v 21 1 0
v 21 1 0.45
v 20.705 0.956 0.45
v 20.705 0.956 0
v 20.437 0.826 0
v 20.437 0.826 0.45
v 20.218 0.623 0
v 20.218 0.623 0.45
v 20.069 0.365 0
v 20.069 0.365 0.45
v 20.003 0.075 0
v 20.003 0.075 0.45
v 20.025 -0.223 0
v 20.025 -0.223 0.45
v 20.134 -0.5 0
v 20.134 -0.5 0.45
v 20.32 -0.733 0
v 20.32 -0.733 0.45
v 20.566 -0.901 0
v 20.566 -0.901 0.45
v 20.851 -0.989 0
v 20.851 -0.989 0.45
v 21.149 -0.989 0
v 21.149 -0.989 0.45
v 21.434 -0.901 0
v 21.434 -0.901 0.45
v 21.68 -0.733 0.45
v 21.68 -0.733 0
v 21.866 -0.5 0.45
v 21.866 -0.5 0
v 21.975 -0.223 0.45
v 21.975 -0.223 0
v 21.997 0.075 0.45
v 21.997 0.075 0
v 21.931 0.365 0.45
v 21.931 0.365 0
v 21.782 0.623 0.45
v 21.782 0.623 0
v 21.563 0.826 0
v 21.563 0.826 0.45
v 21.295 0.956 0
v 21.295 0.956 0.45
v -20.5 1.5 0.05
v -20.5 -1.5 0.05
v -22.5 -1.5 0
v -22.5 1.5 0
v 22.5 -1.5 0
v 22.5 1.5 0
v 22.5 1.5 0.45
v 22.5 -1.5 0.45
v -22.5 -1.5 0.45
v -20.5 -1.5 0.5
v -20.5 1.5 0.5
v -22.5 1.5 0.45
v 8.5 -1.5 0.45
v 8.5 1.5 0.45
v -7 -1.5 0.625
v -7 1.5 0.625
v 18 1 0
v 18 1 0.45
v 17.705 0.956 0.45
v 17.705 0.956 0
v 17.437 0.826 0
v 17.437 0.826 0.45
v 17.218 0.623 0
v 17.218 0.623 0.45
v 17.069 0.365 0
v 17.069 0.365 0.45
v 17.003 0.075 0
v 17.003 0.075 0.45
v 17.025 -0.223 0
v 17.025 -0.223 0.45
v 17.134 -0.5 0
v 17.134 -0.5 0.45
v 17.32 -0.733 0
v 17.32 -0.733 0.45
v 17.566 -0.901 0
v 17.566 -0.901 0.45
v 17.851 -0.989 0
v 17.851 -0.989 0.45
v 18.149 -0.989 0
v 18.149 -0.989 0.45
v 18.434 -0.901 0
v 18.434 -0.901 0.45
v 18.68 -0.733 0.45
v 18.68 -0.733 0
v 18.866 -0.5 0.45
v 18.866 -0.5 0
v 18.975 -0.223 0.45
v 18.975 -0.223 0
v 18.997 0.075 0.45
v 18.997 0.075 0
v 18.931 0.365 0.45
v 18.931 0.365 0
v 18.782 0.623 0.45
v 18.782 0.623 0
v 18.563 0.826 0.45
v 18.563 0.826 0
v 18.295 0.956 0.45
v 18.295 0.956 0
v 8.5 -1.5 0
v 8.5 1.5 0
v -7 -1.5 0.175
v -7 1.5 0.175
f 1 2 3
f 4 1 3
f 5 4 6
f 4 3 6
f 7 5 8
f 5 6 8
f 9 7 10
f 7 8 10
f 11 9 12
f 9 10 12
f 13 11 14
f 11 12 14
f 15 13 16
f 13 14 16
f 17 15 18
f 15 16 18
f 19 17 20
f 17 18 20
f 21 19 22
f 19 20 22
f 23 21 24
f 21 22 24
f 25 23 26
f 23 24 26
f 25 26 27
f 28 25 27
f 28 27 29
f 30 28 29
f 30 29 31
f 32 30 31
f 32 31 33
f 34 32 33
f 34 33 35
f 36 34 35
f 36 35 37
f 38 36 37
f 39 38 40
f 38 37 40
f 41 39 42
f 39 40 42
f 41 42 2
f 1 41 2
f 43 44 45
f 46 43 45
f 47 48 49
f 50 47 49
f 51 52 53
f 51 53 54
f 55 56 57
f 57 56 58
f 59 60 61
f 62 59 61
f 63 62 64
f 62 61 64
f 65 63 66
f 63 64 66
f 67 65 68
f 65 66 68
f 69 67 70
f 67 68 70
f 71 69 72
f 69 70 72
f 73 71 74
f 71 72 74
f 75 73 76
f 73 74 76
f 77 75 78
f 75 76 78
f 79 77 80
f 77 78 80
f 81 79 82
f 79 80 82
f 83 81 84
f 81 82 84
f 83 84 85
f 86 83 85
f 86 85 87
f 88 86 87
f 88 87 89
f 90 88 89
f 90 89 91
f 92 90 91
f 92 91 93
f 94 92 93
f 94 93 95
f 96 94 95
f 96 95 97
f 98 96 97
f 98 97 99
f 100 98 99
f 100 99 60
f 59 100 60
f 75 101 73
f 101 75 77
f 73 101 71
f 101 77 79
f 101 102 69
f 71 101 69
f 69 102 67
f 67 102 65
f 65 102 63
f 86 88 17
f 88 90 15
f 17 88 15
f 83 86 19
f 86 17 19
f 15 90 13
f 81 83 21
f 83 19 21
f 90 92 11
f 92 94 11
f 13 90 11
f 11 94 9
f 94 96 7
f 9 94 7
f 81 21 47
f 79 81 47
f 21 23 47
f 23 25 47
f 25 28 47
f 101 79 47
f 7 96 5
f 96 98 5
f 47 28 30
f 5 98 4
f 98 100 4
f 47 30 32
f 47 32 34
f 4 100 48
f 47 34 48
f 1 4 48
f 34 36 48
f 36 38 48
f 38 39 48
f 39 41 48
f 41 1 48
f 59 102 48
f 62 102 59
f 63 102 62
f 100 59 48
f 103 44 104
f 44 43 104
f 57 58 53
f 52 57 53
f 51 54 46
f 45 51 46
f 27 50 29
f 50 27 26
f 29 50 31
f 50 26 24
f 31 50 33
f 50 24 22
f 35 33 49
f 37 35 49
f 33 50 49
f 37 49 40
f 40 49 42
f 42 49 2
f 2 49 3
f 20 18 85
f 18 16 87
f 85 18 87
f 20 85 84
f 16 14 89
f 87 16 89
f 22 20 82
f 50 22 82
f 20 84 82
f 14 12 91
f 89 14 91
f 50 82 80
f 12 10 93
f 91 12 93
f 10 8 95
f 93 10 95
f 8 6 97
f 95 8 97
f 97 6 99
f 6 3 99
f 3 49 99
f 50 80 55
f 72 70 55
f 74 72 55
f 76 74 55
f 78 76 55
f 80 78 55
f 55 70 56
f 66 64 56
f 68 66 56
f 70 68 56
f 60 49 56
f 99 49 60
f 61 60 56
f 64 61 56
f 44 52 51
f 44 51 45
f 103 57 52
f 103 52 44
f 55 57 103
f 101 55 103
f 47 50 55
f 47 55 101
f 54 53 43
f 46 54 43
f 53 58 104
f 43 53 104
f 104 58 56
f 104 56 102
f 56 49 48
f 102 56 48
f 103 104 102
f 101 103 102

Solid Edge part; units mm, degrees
sketch "Sketch1" plane through (0, 0, 0) normal (0, -1, 0) x (1, 0, 0)
  line L0 (8.5, 0.45) -> (-7, 0.625)
  line L1 (-7, 0.625) -> (-20.5, 0.5)
  line L2 (-20.5, 0.5) -> (-22.5, 0.45)
  line L3 (-22.5, 0.45) -> (-22.5, 0)
  line L4 (-20.5, 0.05) -> (-22.5, 0)
  line L5 (-20.5, 0.05) -> (-7, 0.175)
  line L6 (-7, 0.175) -> (8.5, 0)
  line L7 (8.5, 0) -> (22.5, 0)
  line L8 (22.5, 0) -> (22.5, 0.45)
  line L9 (22.5, 0.45) -> (8.5, 0.45)
extrude "Protrusion1" add sketch "Sketch1" along normal mid plane 3
sketch "Sketch2" plane through (15.5, 0, 0.45) normal (0, 0, 1) x (0, 1, 0)
  circle A0 centre (0, -2.5) radius 1
extrude "ExtrudedCutout_3" cut sketch "Sketch2" against normal blind 0.45
sketch "Sketch3" plane through (15.5, 0, 0.45) normal (0, 0, 1) x (0, 1, 0)
  circle A0 centre (0, -5.5) radius 1
extrude "ExtrudedCutout_4" cut sketch "Sketch3" against normal blind 0.45
